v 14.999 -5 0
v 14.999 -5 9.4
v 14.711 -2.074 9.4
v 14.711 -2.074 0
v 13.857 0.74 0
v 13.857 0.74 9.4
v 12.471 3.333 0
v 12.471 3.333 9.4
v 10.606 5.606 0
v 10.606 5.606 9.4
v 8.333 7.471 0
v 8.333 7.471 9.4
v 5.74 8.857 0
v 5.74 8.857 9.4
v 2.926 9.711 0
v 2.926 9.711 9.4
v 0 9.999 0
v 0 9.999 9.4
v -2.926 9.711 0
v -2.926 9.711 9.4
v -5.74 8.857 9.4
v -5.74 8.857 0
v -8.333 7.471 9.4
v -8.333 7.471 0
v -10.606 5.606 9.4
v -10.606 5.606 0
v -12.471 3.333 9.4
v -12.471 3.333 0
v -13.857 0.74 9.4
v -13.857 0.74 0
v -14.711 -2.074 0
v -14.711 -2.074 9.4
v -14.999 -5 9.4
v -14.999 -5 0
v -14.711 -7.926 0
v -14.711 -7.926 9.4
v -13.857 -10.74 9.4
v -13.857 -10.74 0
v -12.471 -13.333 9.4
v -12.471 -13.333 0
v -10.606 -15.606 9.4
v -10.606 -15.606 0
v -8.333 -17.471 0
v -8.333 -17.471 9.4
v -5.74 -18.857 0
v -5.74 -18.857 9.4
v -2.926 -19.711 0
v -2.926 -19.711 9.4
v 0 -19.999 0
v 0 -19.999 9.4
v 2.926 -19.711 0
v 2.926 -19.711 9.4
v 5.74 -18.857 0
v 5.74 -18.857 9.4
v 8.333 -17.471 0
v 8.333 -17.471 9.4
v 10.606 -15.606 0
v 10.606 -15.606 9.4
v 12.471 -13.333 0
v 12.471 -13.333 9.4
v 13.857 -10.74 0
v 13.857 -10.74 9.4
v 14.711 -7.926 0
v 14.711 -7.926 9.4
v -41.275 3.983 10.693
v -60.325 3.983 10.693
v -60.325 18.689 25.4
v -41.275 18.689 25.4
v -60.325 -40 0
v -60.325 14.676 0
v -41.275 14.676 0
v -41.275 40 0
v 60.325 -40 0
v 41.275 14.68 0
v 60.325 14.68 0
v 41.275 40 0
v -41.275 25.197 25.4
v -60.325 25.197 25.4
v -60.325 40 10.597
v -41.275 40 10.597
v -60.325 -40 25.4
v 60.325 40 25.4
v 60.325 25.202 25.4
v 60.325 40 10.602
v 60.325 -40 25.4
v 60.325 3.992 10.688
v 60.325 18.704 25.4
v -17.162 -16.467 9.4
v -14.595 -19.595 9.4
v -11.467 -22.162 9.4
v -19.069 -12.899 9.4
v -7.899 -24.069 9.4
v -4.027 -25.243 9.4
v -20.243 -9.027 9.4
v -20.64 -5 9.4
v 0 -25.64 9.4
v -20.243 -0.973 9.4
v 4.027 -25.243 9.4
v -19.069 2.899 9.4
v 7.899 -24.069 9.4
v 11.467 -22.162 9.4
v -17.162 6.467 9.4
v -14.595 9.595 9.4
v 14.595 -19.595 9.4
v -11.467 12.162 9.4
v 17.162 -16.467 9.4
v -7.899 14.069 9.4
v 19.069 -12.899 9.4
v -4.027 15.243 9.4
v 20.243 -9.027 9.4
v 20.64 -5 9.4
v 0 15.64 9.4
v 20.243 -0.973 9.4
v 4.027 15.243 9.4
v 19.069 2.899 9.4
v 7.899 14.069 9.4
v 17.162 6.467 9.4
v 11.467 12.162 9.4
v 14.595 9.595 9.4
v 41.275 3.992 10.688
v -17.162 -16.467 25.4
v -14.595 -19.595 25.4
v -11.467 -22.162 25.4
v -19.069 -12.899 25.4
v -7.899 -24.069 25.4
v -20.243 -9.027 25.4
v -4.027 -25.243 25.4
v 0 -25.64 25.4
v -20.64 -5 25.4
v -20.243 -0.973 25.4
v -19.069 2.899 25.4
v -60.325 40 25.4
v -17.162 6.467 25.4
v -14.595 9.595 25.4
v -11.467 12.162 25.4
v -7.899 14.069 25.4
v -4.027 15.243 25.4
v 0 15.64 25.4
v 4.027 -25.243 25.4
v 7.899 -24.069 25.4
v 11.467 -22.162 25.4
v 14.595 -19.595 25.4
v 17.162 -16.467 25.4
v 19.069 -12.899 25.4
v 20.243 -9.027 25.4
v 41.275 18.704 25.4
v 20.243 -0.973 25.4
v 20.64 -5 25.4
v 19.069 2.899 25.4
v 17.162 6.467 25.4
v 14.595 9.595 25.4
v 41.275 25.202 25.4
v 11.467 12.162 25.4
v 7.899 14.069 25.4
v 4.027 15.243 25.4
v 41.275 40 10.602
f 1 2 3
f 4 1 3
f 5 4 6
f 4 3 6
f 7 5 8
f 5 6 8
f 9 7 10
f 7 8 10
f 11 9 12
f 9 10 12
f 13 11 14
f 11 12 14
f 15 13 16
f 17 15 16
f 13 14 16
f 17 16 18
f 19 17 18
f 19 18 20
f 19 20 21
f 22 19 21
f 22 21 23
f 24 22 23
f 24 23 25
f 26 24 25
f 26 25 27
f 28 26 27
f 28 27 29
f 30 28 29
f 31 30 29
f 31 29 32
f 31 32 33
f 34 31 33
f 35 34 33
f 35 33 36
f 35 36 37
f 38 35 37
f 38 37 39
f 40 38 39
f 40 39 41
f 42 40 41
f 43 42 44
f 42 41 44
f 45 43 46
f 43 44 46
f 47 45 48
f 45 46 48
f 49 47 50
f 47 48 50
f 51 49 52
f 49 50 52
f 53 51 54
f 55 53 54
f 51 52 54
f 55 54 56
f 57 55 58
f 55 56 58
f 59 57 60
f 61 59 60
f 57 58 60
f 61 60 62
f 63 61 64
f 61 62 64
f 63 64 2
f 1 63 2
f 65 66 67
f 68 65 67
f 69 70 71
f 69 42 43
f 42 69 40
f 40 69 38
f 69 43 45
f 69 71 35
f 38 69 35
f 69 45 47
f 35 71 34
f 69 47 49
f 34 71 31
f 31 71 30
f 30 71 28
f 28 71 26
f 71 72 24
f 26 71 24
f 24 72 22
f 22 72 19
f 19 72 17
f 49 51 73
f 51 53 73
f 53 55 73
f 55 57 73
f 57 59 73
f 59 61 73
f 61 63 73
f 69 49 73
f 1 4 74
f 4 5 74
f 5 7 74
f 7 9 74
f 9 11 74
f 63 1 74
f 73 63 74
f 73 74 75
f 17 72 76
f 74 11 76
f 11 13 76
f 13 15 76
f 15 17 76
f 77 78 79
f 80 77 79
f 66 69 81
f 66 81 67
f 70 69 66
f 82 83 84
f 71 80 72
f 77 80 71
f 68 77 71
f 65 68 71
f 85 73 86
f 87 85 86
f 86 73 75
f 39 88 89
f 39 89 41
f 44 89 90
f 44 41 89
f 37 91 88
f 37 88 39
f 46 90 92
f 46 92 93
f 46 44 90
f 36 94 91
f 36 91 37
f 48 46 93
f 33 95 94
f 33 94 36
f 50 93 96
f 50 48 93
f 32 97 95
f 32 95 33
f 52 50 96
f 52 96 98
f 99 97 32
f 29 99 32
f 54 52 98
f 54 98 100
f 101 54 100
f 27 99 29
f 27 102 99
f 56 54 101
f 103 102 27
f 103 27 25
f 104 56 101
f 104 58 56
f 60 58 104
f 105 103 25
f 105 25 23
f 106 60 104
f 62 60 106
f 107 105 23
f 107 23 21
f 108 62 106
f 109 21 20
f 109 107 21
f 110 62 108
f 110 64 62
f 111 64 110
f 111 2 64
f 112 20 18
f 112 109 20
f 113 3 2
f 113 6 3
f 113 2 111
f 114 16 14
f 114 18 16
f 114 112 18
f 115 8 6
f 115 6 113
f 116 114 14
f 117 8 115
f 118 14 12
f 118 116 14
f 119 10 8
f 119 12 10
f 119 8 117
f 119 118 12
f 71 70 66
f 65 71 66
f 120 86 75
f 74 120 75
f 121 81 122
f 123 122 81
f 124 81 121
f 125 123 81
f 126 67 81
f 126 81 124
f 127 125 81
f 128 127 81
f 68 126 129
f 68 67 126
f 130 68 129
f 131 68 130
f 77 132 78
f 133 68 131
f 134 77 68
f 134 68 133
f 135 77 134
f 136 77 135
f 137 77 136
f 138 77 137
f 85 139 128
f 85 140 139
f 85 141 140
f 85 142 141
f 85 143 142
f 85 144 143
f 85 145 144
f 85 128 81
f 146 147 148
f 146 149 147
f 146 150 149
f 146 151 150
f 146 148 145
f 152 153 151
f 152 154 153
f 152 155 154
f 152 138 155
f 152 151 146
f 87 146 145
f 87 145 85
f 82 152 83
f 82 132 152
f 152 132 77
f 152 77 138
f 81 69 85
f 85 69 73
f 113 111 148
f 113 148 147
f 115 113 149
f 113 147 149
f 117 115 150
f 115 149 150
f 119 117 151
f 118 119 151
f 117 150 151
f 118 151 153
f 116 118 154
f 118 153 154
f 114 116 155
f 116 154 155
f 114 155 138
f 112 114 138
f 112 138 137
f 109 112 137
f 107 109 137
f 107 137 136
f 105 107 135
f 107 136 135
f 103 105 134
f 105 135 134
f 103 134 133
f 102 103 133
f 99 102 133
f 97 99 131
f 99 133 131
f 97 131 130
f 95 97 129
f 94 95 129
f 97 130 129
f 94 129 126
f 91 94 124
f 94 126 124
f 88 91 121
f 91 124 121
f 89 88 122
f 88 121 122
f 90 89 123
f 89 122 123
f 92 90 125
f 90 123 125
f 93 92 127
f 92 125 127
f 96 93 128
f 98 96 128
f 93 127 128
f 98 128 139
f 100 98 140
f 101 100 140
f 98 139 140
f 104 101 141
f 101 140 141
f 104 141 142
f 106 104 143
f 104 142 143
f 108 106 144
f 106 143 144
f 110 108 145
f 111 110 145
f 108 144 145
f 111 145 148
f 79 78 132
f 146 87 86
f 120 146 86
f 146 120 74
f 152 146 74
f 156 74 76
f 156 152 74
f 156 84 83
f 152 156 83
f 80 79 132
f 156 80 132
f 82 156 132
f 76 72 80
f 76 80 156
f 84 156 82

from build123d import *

# Parameters (mm, degrees)
F0_W     = 120.65
F0_H     = 80
F1_DEPTH = 25.4
F3_DEPTH = 19.05
F4_R     = 20.64
F5_DEPTH = 16
F7_DEPTH = 19.05
F8_R     = 14.9987
F9_DEPTH = 25.401


with BuildPart() as f1:
    # F0 (on Top) → F1 (new body)
    with BuildSketch(Plane.XY):
        Rectangle(F0_W, F0_H)
    extrude(amount=F1_DEPTH)

    # F2 (on face) → F3 (cut)
    with BuildSketch(Plane.YZ.offset(60.325)):
        Polygon((21.952974, 28.64855), (3.992462, 10.688038), (39.347801, -24.667301), (57.308314, -6.706789), align=None)
    extrude(amount=-F3_DEPTH, mode=Mode.SUBTRACT)

    # F4 (on face) → F5 (cut)
    with BuildSketch(Plane.XY.offset(25.4)):
        with Locations((0, -5)):
            Circle(F4_R)
    extrude(amount=-F5_DEPTH, mode=Mode.SUBTRACT)

    # F6 (on face) → F7 (cut)
    with BuildSketch(Plane(origin=(-60.325, 0, 0), x_dir=(0, -1, 0), z_dir=(-1, 0, 0))):
        Polygon((-21.943312, 28.653912), (-57.307561, -6.710336), (-39.347049, -24.670849), (-3.9828, 10.6934), align=None)
    extrude(amount=-F7_DEPTH, mode=Mode.SUBTRACT)

    # F8 (on face) → F9 (cut, through all)
    with BuildSketch(Plane.XY.offset(25.4)):
        with Locations((0, -5)):
            Circle(F8_R)
    extrude(amount=-F9_DEPTH, mode=Mode.SUBTRACT)


solid = f1.part
